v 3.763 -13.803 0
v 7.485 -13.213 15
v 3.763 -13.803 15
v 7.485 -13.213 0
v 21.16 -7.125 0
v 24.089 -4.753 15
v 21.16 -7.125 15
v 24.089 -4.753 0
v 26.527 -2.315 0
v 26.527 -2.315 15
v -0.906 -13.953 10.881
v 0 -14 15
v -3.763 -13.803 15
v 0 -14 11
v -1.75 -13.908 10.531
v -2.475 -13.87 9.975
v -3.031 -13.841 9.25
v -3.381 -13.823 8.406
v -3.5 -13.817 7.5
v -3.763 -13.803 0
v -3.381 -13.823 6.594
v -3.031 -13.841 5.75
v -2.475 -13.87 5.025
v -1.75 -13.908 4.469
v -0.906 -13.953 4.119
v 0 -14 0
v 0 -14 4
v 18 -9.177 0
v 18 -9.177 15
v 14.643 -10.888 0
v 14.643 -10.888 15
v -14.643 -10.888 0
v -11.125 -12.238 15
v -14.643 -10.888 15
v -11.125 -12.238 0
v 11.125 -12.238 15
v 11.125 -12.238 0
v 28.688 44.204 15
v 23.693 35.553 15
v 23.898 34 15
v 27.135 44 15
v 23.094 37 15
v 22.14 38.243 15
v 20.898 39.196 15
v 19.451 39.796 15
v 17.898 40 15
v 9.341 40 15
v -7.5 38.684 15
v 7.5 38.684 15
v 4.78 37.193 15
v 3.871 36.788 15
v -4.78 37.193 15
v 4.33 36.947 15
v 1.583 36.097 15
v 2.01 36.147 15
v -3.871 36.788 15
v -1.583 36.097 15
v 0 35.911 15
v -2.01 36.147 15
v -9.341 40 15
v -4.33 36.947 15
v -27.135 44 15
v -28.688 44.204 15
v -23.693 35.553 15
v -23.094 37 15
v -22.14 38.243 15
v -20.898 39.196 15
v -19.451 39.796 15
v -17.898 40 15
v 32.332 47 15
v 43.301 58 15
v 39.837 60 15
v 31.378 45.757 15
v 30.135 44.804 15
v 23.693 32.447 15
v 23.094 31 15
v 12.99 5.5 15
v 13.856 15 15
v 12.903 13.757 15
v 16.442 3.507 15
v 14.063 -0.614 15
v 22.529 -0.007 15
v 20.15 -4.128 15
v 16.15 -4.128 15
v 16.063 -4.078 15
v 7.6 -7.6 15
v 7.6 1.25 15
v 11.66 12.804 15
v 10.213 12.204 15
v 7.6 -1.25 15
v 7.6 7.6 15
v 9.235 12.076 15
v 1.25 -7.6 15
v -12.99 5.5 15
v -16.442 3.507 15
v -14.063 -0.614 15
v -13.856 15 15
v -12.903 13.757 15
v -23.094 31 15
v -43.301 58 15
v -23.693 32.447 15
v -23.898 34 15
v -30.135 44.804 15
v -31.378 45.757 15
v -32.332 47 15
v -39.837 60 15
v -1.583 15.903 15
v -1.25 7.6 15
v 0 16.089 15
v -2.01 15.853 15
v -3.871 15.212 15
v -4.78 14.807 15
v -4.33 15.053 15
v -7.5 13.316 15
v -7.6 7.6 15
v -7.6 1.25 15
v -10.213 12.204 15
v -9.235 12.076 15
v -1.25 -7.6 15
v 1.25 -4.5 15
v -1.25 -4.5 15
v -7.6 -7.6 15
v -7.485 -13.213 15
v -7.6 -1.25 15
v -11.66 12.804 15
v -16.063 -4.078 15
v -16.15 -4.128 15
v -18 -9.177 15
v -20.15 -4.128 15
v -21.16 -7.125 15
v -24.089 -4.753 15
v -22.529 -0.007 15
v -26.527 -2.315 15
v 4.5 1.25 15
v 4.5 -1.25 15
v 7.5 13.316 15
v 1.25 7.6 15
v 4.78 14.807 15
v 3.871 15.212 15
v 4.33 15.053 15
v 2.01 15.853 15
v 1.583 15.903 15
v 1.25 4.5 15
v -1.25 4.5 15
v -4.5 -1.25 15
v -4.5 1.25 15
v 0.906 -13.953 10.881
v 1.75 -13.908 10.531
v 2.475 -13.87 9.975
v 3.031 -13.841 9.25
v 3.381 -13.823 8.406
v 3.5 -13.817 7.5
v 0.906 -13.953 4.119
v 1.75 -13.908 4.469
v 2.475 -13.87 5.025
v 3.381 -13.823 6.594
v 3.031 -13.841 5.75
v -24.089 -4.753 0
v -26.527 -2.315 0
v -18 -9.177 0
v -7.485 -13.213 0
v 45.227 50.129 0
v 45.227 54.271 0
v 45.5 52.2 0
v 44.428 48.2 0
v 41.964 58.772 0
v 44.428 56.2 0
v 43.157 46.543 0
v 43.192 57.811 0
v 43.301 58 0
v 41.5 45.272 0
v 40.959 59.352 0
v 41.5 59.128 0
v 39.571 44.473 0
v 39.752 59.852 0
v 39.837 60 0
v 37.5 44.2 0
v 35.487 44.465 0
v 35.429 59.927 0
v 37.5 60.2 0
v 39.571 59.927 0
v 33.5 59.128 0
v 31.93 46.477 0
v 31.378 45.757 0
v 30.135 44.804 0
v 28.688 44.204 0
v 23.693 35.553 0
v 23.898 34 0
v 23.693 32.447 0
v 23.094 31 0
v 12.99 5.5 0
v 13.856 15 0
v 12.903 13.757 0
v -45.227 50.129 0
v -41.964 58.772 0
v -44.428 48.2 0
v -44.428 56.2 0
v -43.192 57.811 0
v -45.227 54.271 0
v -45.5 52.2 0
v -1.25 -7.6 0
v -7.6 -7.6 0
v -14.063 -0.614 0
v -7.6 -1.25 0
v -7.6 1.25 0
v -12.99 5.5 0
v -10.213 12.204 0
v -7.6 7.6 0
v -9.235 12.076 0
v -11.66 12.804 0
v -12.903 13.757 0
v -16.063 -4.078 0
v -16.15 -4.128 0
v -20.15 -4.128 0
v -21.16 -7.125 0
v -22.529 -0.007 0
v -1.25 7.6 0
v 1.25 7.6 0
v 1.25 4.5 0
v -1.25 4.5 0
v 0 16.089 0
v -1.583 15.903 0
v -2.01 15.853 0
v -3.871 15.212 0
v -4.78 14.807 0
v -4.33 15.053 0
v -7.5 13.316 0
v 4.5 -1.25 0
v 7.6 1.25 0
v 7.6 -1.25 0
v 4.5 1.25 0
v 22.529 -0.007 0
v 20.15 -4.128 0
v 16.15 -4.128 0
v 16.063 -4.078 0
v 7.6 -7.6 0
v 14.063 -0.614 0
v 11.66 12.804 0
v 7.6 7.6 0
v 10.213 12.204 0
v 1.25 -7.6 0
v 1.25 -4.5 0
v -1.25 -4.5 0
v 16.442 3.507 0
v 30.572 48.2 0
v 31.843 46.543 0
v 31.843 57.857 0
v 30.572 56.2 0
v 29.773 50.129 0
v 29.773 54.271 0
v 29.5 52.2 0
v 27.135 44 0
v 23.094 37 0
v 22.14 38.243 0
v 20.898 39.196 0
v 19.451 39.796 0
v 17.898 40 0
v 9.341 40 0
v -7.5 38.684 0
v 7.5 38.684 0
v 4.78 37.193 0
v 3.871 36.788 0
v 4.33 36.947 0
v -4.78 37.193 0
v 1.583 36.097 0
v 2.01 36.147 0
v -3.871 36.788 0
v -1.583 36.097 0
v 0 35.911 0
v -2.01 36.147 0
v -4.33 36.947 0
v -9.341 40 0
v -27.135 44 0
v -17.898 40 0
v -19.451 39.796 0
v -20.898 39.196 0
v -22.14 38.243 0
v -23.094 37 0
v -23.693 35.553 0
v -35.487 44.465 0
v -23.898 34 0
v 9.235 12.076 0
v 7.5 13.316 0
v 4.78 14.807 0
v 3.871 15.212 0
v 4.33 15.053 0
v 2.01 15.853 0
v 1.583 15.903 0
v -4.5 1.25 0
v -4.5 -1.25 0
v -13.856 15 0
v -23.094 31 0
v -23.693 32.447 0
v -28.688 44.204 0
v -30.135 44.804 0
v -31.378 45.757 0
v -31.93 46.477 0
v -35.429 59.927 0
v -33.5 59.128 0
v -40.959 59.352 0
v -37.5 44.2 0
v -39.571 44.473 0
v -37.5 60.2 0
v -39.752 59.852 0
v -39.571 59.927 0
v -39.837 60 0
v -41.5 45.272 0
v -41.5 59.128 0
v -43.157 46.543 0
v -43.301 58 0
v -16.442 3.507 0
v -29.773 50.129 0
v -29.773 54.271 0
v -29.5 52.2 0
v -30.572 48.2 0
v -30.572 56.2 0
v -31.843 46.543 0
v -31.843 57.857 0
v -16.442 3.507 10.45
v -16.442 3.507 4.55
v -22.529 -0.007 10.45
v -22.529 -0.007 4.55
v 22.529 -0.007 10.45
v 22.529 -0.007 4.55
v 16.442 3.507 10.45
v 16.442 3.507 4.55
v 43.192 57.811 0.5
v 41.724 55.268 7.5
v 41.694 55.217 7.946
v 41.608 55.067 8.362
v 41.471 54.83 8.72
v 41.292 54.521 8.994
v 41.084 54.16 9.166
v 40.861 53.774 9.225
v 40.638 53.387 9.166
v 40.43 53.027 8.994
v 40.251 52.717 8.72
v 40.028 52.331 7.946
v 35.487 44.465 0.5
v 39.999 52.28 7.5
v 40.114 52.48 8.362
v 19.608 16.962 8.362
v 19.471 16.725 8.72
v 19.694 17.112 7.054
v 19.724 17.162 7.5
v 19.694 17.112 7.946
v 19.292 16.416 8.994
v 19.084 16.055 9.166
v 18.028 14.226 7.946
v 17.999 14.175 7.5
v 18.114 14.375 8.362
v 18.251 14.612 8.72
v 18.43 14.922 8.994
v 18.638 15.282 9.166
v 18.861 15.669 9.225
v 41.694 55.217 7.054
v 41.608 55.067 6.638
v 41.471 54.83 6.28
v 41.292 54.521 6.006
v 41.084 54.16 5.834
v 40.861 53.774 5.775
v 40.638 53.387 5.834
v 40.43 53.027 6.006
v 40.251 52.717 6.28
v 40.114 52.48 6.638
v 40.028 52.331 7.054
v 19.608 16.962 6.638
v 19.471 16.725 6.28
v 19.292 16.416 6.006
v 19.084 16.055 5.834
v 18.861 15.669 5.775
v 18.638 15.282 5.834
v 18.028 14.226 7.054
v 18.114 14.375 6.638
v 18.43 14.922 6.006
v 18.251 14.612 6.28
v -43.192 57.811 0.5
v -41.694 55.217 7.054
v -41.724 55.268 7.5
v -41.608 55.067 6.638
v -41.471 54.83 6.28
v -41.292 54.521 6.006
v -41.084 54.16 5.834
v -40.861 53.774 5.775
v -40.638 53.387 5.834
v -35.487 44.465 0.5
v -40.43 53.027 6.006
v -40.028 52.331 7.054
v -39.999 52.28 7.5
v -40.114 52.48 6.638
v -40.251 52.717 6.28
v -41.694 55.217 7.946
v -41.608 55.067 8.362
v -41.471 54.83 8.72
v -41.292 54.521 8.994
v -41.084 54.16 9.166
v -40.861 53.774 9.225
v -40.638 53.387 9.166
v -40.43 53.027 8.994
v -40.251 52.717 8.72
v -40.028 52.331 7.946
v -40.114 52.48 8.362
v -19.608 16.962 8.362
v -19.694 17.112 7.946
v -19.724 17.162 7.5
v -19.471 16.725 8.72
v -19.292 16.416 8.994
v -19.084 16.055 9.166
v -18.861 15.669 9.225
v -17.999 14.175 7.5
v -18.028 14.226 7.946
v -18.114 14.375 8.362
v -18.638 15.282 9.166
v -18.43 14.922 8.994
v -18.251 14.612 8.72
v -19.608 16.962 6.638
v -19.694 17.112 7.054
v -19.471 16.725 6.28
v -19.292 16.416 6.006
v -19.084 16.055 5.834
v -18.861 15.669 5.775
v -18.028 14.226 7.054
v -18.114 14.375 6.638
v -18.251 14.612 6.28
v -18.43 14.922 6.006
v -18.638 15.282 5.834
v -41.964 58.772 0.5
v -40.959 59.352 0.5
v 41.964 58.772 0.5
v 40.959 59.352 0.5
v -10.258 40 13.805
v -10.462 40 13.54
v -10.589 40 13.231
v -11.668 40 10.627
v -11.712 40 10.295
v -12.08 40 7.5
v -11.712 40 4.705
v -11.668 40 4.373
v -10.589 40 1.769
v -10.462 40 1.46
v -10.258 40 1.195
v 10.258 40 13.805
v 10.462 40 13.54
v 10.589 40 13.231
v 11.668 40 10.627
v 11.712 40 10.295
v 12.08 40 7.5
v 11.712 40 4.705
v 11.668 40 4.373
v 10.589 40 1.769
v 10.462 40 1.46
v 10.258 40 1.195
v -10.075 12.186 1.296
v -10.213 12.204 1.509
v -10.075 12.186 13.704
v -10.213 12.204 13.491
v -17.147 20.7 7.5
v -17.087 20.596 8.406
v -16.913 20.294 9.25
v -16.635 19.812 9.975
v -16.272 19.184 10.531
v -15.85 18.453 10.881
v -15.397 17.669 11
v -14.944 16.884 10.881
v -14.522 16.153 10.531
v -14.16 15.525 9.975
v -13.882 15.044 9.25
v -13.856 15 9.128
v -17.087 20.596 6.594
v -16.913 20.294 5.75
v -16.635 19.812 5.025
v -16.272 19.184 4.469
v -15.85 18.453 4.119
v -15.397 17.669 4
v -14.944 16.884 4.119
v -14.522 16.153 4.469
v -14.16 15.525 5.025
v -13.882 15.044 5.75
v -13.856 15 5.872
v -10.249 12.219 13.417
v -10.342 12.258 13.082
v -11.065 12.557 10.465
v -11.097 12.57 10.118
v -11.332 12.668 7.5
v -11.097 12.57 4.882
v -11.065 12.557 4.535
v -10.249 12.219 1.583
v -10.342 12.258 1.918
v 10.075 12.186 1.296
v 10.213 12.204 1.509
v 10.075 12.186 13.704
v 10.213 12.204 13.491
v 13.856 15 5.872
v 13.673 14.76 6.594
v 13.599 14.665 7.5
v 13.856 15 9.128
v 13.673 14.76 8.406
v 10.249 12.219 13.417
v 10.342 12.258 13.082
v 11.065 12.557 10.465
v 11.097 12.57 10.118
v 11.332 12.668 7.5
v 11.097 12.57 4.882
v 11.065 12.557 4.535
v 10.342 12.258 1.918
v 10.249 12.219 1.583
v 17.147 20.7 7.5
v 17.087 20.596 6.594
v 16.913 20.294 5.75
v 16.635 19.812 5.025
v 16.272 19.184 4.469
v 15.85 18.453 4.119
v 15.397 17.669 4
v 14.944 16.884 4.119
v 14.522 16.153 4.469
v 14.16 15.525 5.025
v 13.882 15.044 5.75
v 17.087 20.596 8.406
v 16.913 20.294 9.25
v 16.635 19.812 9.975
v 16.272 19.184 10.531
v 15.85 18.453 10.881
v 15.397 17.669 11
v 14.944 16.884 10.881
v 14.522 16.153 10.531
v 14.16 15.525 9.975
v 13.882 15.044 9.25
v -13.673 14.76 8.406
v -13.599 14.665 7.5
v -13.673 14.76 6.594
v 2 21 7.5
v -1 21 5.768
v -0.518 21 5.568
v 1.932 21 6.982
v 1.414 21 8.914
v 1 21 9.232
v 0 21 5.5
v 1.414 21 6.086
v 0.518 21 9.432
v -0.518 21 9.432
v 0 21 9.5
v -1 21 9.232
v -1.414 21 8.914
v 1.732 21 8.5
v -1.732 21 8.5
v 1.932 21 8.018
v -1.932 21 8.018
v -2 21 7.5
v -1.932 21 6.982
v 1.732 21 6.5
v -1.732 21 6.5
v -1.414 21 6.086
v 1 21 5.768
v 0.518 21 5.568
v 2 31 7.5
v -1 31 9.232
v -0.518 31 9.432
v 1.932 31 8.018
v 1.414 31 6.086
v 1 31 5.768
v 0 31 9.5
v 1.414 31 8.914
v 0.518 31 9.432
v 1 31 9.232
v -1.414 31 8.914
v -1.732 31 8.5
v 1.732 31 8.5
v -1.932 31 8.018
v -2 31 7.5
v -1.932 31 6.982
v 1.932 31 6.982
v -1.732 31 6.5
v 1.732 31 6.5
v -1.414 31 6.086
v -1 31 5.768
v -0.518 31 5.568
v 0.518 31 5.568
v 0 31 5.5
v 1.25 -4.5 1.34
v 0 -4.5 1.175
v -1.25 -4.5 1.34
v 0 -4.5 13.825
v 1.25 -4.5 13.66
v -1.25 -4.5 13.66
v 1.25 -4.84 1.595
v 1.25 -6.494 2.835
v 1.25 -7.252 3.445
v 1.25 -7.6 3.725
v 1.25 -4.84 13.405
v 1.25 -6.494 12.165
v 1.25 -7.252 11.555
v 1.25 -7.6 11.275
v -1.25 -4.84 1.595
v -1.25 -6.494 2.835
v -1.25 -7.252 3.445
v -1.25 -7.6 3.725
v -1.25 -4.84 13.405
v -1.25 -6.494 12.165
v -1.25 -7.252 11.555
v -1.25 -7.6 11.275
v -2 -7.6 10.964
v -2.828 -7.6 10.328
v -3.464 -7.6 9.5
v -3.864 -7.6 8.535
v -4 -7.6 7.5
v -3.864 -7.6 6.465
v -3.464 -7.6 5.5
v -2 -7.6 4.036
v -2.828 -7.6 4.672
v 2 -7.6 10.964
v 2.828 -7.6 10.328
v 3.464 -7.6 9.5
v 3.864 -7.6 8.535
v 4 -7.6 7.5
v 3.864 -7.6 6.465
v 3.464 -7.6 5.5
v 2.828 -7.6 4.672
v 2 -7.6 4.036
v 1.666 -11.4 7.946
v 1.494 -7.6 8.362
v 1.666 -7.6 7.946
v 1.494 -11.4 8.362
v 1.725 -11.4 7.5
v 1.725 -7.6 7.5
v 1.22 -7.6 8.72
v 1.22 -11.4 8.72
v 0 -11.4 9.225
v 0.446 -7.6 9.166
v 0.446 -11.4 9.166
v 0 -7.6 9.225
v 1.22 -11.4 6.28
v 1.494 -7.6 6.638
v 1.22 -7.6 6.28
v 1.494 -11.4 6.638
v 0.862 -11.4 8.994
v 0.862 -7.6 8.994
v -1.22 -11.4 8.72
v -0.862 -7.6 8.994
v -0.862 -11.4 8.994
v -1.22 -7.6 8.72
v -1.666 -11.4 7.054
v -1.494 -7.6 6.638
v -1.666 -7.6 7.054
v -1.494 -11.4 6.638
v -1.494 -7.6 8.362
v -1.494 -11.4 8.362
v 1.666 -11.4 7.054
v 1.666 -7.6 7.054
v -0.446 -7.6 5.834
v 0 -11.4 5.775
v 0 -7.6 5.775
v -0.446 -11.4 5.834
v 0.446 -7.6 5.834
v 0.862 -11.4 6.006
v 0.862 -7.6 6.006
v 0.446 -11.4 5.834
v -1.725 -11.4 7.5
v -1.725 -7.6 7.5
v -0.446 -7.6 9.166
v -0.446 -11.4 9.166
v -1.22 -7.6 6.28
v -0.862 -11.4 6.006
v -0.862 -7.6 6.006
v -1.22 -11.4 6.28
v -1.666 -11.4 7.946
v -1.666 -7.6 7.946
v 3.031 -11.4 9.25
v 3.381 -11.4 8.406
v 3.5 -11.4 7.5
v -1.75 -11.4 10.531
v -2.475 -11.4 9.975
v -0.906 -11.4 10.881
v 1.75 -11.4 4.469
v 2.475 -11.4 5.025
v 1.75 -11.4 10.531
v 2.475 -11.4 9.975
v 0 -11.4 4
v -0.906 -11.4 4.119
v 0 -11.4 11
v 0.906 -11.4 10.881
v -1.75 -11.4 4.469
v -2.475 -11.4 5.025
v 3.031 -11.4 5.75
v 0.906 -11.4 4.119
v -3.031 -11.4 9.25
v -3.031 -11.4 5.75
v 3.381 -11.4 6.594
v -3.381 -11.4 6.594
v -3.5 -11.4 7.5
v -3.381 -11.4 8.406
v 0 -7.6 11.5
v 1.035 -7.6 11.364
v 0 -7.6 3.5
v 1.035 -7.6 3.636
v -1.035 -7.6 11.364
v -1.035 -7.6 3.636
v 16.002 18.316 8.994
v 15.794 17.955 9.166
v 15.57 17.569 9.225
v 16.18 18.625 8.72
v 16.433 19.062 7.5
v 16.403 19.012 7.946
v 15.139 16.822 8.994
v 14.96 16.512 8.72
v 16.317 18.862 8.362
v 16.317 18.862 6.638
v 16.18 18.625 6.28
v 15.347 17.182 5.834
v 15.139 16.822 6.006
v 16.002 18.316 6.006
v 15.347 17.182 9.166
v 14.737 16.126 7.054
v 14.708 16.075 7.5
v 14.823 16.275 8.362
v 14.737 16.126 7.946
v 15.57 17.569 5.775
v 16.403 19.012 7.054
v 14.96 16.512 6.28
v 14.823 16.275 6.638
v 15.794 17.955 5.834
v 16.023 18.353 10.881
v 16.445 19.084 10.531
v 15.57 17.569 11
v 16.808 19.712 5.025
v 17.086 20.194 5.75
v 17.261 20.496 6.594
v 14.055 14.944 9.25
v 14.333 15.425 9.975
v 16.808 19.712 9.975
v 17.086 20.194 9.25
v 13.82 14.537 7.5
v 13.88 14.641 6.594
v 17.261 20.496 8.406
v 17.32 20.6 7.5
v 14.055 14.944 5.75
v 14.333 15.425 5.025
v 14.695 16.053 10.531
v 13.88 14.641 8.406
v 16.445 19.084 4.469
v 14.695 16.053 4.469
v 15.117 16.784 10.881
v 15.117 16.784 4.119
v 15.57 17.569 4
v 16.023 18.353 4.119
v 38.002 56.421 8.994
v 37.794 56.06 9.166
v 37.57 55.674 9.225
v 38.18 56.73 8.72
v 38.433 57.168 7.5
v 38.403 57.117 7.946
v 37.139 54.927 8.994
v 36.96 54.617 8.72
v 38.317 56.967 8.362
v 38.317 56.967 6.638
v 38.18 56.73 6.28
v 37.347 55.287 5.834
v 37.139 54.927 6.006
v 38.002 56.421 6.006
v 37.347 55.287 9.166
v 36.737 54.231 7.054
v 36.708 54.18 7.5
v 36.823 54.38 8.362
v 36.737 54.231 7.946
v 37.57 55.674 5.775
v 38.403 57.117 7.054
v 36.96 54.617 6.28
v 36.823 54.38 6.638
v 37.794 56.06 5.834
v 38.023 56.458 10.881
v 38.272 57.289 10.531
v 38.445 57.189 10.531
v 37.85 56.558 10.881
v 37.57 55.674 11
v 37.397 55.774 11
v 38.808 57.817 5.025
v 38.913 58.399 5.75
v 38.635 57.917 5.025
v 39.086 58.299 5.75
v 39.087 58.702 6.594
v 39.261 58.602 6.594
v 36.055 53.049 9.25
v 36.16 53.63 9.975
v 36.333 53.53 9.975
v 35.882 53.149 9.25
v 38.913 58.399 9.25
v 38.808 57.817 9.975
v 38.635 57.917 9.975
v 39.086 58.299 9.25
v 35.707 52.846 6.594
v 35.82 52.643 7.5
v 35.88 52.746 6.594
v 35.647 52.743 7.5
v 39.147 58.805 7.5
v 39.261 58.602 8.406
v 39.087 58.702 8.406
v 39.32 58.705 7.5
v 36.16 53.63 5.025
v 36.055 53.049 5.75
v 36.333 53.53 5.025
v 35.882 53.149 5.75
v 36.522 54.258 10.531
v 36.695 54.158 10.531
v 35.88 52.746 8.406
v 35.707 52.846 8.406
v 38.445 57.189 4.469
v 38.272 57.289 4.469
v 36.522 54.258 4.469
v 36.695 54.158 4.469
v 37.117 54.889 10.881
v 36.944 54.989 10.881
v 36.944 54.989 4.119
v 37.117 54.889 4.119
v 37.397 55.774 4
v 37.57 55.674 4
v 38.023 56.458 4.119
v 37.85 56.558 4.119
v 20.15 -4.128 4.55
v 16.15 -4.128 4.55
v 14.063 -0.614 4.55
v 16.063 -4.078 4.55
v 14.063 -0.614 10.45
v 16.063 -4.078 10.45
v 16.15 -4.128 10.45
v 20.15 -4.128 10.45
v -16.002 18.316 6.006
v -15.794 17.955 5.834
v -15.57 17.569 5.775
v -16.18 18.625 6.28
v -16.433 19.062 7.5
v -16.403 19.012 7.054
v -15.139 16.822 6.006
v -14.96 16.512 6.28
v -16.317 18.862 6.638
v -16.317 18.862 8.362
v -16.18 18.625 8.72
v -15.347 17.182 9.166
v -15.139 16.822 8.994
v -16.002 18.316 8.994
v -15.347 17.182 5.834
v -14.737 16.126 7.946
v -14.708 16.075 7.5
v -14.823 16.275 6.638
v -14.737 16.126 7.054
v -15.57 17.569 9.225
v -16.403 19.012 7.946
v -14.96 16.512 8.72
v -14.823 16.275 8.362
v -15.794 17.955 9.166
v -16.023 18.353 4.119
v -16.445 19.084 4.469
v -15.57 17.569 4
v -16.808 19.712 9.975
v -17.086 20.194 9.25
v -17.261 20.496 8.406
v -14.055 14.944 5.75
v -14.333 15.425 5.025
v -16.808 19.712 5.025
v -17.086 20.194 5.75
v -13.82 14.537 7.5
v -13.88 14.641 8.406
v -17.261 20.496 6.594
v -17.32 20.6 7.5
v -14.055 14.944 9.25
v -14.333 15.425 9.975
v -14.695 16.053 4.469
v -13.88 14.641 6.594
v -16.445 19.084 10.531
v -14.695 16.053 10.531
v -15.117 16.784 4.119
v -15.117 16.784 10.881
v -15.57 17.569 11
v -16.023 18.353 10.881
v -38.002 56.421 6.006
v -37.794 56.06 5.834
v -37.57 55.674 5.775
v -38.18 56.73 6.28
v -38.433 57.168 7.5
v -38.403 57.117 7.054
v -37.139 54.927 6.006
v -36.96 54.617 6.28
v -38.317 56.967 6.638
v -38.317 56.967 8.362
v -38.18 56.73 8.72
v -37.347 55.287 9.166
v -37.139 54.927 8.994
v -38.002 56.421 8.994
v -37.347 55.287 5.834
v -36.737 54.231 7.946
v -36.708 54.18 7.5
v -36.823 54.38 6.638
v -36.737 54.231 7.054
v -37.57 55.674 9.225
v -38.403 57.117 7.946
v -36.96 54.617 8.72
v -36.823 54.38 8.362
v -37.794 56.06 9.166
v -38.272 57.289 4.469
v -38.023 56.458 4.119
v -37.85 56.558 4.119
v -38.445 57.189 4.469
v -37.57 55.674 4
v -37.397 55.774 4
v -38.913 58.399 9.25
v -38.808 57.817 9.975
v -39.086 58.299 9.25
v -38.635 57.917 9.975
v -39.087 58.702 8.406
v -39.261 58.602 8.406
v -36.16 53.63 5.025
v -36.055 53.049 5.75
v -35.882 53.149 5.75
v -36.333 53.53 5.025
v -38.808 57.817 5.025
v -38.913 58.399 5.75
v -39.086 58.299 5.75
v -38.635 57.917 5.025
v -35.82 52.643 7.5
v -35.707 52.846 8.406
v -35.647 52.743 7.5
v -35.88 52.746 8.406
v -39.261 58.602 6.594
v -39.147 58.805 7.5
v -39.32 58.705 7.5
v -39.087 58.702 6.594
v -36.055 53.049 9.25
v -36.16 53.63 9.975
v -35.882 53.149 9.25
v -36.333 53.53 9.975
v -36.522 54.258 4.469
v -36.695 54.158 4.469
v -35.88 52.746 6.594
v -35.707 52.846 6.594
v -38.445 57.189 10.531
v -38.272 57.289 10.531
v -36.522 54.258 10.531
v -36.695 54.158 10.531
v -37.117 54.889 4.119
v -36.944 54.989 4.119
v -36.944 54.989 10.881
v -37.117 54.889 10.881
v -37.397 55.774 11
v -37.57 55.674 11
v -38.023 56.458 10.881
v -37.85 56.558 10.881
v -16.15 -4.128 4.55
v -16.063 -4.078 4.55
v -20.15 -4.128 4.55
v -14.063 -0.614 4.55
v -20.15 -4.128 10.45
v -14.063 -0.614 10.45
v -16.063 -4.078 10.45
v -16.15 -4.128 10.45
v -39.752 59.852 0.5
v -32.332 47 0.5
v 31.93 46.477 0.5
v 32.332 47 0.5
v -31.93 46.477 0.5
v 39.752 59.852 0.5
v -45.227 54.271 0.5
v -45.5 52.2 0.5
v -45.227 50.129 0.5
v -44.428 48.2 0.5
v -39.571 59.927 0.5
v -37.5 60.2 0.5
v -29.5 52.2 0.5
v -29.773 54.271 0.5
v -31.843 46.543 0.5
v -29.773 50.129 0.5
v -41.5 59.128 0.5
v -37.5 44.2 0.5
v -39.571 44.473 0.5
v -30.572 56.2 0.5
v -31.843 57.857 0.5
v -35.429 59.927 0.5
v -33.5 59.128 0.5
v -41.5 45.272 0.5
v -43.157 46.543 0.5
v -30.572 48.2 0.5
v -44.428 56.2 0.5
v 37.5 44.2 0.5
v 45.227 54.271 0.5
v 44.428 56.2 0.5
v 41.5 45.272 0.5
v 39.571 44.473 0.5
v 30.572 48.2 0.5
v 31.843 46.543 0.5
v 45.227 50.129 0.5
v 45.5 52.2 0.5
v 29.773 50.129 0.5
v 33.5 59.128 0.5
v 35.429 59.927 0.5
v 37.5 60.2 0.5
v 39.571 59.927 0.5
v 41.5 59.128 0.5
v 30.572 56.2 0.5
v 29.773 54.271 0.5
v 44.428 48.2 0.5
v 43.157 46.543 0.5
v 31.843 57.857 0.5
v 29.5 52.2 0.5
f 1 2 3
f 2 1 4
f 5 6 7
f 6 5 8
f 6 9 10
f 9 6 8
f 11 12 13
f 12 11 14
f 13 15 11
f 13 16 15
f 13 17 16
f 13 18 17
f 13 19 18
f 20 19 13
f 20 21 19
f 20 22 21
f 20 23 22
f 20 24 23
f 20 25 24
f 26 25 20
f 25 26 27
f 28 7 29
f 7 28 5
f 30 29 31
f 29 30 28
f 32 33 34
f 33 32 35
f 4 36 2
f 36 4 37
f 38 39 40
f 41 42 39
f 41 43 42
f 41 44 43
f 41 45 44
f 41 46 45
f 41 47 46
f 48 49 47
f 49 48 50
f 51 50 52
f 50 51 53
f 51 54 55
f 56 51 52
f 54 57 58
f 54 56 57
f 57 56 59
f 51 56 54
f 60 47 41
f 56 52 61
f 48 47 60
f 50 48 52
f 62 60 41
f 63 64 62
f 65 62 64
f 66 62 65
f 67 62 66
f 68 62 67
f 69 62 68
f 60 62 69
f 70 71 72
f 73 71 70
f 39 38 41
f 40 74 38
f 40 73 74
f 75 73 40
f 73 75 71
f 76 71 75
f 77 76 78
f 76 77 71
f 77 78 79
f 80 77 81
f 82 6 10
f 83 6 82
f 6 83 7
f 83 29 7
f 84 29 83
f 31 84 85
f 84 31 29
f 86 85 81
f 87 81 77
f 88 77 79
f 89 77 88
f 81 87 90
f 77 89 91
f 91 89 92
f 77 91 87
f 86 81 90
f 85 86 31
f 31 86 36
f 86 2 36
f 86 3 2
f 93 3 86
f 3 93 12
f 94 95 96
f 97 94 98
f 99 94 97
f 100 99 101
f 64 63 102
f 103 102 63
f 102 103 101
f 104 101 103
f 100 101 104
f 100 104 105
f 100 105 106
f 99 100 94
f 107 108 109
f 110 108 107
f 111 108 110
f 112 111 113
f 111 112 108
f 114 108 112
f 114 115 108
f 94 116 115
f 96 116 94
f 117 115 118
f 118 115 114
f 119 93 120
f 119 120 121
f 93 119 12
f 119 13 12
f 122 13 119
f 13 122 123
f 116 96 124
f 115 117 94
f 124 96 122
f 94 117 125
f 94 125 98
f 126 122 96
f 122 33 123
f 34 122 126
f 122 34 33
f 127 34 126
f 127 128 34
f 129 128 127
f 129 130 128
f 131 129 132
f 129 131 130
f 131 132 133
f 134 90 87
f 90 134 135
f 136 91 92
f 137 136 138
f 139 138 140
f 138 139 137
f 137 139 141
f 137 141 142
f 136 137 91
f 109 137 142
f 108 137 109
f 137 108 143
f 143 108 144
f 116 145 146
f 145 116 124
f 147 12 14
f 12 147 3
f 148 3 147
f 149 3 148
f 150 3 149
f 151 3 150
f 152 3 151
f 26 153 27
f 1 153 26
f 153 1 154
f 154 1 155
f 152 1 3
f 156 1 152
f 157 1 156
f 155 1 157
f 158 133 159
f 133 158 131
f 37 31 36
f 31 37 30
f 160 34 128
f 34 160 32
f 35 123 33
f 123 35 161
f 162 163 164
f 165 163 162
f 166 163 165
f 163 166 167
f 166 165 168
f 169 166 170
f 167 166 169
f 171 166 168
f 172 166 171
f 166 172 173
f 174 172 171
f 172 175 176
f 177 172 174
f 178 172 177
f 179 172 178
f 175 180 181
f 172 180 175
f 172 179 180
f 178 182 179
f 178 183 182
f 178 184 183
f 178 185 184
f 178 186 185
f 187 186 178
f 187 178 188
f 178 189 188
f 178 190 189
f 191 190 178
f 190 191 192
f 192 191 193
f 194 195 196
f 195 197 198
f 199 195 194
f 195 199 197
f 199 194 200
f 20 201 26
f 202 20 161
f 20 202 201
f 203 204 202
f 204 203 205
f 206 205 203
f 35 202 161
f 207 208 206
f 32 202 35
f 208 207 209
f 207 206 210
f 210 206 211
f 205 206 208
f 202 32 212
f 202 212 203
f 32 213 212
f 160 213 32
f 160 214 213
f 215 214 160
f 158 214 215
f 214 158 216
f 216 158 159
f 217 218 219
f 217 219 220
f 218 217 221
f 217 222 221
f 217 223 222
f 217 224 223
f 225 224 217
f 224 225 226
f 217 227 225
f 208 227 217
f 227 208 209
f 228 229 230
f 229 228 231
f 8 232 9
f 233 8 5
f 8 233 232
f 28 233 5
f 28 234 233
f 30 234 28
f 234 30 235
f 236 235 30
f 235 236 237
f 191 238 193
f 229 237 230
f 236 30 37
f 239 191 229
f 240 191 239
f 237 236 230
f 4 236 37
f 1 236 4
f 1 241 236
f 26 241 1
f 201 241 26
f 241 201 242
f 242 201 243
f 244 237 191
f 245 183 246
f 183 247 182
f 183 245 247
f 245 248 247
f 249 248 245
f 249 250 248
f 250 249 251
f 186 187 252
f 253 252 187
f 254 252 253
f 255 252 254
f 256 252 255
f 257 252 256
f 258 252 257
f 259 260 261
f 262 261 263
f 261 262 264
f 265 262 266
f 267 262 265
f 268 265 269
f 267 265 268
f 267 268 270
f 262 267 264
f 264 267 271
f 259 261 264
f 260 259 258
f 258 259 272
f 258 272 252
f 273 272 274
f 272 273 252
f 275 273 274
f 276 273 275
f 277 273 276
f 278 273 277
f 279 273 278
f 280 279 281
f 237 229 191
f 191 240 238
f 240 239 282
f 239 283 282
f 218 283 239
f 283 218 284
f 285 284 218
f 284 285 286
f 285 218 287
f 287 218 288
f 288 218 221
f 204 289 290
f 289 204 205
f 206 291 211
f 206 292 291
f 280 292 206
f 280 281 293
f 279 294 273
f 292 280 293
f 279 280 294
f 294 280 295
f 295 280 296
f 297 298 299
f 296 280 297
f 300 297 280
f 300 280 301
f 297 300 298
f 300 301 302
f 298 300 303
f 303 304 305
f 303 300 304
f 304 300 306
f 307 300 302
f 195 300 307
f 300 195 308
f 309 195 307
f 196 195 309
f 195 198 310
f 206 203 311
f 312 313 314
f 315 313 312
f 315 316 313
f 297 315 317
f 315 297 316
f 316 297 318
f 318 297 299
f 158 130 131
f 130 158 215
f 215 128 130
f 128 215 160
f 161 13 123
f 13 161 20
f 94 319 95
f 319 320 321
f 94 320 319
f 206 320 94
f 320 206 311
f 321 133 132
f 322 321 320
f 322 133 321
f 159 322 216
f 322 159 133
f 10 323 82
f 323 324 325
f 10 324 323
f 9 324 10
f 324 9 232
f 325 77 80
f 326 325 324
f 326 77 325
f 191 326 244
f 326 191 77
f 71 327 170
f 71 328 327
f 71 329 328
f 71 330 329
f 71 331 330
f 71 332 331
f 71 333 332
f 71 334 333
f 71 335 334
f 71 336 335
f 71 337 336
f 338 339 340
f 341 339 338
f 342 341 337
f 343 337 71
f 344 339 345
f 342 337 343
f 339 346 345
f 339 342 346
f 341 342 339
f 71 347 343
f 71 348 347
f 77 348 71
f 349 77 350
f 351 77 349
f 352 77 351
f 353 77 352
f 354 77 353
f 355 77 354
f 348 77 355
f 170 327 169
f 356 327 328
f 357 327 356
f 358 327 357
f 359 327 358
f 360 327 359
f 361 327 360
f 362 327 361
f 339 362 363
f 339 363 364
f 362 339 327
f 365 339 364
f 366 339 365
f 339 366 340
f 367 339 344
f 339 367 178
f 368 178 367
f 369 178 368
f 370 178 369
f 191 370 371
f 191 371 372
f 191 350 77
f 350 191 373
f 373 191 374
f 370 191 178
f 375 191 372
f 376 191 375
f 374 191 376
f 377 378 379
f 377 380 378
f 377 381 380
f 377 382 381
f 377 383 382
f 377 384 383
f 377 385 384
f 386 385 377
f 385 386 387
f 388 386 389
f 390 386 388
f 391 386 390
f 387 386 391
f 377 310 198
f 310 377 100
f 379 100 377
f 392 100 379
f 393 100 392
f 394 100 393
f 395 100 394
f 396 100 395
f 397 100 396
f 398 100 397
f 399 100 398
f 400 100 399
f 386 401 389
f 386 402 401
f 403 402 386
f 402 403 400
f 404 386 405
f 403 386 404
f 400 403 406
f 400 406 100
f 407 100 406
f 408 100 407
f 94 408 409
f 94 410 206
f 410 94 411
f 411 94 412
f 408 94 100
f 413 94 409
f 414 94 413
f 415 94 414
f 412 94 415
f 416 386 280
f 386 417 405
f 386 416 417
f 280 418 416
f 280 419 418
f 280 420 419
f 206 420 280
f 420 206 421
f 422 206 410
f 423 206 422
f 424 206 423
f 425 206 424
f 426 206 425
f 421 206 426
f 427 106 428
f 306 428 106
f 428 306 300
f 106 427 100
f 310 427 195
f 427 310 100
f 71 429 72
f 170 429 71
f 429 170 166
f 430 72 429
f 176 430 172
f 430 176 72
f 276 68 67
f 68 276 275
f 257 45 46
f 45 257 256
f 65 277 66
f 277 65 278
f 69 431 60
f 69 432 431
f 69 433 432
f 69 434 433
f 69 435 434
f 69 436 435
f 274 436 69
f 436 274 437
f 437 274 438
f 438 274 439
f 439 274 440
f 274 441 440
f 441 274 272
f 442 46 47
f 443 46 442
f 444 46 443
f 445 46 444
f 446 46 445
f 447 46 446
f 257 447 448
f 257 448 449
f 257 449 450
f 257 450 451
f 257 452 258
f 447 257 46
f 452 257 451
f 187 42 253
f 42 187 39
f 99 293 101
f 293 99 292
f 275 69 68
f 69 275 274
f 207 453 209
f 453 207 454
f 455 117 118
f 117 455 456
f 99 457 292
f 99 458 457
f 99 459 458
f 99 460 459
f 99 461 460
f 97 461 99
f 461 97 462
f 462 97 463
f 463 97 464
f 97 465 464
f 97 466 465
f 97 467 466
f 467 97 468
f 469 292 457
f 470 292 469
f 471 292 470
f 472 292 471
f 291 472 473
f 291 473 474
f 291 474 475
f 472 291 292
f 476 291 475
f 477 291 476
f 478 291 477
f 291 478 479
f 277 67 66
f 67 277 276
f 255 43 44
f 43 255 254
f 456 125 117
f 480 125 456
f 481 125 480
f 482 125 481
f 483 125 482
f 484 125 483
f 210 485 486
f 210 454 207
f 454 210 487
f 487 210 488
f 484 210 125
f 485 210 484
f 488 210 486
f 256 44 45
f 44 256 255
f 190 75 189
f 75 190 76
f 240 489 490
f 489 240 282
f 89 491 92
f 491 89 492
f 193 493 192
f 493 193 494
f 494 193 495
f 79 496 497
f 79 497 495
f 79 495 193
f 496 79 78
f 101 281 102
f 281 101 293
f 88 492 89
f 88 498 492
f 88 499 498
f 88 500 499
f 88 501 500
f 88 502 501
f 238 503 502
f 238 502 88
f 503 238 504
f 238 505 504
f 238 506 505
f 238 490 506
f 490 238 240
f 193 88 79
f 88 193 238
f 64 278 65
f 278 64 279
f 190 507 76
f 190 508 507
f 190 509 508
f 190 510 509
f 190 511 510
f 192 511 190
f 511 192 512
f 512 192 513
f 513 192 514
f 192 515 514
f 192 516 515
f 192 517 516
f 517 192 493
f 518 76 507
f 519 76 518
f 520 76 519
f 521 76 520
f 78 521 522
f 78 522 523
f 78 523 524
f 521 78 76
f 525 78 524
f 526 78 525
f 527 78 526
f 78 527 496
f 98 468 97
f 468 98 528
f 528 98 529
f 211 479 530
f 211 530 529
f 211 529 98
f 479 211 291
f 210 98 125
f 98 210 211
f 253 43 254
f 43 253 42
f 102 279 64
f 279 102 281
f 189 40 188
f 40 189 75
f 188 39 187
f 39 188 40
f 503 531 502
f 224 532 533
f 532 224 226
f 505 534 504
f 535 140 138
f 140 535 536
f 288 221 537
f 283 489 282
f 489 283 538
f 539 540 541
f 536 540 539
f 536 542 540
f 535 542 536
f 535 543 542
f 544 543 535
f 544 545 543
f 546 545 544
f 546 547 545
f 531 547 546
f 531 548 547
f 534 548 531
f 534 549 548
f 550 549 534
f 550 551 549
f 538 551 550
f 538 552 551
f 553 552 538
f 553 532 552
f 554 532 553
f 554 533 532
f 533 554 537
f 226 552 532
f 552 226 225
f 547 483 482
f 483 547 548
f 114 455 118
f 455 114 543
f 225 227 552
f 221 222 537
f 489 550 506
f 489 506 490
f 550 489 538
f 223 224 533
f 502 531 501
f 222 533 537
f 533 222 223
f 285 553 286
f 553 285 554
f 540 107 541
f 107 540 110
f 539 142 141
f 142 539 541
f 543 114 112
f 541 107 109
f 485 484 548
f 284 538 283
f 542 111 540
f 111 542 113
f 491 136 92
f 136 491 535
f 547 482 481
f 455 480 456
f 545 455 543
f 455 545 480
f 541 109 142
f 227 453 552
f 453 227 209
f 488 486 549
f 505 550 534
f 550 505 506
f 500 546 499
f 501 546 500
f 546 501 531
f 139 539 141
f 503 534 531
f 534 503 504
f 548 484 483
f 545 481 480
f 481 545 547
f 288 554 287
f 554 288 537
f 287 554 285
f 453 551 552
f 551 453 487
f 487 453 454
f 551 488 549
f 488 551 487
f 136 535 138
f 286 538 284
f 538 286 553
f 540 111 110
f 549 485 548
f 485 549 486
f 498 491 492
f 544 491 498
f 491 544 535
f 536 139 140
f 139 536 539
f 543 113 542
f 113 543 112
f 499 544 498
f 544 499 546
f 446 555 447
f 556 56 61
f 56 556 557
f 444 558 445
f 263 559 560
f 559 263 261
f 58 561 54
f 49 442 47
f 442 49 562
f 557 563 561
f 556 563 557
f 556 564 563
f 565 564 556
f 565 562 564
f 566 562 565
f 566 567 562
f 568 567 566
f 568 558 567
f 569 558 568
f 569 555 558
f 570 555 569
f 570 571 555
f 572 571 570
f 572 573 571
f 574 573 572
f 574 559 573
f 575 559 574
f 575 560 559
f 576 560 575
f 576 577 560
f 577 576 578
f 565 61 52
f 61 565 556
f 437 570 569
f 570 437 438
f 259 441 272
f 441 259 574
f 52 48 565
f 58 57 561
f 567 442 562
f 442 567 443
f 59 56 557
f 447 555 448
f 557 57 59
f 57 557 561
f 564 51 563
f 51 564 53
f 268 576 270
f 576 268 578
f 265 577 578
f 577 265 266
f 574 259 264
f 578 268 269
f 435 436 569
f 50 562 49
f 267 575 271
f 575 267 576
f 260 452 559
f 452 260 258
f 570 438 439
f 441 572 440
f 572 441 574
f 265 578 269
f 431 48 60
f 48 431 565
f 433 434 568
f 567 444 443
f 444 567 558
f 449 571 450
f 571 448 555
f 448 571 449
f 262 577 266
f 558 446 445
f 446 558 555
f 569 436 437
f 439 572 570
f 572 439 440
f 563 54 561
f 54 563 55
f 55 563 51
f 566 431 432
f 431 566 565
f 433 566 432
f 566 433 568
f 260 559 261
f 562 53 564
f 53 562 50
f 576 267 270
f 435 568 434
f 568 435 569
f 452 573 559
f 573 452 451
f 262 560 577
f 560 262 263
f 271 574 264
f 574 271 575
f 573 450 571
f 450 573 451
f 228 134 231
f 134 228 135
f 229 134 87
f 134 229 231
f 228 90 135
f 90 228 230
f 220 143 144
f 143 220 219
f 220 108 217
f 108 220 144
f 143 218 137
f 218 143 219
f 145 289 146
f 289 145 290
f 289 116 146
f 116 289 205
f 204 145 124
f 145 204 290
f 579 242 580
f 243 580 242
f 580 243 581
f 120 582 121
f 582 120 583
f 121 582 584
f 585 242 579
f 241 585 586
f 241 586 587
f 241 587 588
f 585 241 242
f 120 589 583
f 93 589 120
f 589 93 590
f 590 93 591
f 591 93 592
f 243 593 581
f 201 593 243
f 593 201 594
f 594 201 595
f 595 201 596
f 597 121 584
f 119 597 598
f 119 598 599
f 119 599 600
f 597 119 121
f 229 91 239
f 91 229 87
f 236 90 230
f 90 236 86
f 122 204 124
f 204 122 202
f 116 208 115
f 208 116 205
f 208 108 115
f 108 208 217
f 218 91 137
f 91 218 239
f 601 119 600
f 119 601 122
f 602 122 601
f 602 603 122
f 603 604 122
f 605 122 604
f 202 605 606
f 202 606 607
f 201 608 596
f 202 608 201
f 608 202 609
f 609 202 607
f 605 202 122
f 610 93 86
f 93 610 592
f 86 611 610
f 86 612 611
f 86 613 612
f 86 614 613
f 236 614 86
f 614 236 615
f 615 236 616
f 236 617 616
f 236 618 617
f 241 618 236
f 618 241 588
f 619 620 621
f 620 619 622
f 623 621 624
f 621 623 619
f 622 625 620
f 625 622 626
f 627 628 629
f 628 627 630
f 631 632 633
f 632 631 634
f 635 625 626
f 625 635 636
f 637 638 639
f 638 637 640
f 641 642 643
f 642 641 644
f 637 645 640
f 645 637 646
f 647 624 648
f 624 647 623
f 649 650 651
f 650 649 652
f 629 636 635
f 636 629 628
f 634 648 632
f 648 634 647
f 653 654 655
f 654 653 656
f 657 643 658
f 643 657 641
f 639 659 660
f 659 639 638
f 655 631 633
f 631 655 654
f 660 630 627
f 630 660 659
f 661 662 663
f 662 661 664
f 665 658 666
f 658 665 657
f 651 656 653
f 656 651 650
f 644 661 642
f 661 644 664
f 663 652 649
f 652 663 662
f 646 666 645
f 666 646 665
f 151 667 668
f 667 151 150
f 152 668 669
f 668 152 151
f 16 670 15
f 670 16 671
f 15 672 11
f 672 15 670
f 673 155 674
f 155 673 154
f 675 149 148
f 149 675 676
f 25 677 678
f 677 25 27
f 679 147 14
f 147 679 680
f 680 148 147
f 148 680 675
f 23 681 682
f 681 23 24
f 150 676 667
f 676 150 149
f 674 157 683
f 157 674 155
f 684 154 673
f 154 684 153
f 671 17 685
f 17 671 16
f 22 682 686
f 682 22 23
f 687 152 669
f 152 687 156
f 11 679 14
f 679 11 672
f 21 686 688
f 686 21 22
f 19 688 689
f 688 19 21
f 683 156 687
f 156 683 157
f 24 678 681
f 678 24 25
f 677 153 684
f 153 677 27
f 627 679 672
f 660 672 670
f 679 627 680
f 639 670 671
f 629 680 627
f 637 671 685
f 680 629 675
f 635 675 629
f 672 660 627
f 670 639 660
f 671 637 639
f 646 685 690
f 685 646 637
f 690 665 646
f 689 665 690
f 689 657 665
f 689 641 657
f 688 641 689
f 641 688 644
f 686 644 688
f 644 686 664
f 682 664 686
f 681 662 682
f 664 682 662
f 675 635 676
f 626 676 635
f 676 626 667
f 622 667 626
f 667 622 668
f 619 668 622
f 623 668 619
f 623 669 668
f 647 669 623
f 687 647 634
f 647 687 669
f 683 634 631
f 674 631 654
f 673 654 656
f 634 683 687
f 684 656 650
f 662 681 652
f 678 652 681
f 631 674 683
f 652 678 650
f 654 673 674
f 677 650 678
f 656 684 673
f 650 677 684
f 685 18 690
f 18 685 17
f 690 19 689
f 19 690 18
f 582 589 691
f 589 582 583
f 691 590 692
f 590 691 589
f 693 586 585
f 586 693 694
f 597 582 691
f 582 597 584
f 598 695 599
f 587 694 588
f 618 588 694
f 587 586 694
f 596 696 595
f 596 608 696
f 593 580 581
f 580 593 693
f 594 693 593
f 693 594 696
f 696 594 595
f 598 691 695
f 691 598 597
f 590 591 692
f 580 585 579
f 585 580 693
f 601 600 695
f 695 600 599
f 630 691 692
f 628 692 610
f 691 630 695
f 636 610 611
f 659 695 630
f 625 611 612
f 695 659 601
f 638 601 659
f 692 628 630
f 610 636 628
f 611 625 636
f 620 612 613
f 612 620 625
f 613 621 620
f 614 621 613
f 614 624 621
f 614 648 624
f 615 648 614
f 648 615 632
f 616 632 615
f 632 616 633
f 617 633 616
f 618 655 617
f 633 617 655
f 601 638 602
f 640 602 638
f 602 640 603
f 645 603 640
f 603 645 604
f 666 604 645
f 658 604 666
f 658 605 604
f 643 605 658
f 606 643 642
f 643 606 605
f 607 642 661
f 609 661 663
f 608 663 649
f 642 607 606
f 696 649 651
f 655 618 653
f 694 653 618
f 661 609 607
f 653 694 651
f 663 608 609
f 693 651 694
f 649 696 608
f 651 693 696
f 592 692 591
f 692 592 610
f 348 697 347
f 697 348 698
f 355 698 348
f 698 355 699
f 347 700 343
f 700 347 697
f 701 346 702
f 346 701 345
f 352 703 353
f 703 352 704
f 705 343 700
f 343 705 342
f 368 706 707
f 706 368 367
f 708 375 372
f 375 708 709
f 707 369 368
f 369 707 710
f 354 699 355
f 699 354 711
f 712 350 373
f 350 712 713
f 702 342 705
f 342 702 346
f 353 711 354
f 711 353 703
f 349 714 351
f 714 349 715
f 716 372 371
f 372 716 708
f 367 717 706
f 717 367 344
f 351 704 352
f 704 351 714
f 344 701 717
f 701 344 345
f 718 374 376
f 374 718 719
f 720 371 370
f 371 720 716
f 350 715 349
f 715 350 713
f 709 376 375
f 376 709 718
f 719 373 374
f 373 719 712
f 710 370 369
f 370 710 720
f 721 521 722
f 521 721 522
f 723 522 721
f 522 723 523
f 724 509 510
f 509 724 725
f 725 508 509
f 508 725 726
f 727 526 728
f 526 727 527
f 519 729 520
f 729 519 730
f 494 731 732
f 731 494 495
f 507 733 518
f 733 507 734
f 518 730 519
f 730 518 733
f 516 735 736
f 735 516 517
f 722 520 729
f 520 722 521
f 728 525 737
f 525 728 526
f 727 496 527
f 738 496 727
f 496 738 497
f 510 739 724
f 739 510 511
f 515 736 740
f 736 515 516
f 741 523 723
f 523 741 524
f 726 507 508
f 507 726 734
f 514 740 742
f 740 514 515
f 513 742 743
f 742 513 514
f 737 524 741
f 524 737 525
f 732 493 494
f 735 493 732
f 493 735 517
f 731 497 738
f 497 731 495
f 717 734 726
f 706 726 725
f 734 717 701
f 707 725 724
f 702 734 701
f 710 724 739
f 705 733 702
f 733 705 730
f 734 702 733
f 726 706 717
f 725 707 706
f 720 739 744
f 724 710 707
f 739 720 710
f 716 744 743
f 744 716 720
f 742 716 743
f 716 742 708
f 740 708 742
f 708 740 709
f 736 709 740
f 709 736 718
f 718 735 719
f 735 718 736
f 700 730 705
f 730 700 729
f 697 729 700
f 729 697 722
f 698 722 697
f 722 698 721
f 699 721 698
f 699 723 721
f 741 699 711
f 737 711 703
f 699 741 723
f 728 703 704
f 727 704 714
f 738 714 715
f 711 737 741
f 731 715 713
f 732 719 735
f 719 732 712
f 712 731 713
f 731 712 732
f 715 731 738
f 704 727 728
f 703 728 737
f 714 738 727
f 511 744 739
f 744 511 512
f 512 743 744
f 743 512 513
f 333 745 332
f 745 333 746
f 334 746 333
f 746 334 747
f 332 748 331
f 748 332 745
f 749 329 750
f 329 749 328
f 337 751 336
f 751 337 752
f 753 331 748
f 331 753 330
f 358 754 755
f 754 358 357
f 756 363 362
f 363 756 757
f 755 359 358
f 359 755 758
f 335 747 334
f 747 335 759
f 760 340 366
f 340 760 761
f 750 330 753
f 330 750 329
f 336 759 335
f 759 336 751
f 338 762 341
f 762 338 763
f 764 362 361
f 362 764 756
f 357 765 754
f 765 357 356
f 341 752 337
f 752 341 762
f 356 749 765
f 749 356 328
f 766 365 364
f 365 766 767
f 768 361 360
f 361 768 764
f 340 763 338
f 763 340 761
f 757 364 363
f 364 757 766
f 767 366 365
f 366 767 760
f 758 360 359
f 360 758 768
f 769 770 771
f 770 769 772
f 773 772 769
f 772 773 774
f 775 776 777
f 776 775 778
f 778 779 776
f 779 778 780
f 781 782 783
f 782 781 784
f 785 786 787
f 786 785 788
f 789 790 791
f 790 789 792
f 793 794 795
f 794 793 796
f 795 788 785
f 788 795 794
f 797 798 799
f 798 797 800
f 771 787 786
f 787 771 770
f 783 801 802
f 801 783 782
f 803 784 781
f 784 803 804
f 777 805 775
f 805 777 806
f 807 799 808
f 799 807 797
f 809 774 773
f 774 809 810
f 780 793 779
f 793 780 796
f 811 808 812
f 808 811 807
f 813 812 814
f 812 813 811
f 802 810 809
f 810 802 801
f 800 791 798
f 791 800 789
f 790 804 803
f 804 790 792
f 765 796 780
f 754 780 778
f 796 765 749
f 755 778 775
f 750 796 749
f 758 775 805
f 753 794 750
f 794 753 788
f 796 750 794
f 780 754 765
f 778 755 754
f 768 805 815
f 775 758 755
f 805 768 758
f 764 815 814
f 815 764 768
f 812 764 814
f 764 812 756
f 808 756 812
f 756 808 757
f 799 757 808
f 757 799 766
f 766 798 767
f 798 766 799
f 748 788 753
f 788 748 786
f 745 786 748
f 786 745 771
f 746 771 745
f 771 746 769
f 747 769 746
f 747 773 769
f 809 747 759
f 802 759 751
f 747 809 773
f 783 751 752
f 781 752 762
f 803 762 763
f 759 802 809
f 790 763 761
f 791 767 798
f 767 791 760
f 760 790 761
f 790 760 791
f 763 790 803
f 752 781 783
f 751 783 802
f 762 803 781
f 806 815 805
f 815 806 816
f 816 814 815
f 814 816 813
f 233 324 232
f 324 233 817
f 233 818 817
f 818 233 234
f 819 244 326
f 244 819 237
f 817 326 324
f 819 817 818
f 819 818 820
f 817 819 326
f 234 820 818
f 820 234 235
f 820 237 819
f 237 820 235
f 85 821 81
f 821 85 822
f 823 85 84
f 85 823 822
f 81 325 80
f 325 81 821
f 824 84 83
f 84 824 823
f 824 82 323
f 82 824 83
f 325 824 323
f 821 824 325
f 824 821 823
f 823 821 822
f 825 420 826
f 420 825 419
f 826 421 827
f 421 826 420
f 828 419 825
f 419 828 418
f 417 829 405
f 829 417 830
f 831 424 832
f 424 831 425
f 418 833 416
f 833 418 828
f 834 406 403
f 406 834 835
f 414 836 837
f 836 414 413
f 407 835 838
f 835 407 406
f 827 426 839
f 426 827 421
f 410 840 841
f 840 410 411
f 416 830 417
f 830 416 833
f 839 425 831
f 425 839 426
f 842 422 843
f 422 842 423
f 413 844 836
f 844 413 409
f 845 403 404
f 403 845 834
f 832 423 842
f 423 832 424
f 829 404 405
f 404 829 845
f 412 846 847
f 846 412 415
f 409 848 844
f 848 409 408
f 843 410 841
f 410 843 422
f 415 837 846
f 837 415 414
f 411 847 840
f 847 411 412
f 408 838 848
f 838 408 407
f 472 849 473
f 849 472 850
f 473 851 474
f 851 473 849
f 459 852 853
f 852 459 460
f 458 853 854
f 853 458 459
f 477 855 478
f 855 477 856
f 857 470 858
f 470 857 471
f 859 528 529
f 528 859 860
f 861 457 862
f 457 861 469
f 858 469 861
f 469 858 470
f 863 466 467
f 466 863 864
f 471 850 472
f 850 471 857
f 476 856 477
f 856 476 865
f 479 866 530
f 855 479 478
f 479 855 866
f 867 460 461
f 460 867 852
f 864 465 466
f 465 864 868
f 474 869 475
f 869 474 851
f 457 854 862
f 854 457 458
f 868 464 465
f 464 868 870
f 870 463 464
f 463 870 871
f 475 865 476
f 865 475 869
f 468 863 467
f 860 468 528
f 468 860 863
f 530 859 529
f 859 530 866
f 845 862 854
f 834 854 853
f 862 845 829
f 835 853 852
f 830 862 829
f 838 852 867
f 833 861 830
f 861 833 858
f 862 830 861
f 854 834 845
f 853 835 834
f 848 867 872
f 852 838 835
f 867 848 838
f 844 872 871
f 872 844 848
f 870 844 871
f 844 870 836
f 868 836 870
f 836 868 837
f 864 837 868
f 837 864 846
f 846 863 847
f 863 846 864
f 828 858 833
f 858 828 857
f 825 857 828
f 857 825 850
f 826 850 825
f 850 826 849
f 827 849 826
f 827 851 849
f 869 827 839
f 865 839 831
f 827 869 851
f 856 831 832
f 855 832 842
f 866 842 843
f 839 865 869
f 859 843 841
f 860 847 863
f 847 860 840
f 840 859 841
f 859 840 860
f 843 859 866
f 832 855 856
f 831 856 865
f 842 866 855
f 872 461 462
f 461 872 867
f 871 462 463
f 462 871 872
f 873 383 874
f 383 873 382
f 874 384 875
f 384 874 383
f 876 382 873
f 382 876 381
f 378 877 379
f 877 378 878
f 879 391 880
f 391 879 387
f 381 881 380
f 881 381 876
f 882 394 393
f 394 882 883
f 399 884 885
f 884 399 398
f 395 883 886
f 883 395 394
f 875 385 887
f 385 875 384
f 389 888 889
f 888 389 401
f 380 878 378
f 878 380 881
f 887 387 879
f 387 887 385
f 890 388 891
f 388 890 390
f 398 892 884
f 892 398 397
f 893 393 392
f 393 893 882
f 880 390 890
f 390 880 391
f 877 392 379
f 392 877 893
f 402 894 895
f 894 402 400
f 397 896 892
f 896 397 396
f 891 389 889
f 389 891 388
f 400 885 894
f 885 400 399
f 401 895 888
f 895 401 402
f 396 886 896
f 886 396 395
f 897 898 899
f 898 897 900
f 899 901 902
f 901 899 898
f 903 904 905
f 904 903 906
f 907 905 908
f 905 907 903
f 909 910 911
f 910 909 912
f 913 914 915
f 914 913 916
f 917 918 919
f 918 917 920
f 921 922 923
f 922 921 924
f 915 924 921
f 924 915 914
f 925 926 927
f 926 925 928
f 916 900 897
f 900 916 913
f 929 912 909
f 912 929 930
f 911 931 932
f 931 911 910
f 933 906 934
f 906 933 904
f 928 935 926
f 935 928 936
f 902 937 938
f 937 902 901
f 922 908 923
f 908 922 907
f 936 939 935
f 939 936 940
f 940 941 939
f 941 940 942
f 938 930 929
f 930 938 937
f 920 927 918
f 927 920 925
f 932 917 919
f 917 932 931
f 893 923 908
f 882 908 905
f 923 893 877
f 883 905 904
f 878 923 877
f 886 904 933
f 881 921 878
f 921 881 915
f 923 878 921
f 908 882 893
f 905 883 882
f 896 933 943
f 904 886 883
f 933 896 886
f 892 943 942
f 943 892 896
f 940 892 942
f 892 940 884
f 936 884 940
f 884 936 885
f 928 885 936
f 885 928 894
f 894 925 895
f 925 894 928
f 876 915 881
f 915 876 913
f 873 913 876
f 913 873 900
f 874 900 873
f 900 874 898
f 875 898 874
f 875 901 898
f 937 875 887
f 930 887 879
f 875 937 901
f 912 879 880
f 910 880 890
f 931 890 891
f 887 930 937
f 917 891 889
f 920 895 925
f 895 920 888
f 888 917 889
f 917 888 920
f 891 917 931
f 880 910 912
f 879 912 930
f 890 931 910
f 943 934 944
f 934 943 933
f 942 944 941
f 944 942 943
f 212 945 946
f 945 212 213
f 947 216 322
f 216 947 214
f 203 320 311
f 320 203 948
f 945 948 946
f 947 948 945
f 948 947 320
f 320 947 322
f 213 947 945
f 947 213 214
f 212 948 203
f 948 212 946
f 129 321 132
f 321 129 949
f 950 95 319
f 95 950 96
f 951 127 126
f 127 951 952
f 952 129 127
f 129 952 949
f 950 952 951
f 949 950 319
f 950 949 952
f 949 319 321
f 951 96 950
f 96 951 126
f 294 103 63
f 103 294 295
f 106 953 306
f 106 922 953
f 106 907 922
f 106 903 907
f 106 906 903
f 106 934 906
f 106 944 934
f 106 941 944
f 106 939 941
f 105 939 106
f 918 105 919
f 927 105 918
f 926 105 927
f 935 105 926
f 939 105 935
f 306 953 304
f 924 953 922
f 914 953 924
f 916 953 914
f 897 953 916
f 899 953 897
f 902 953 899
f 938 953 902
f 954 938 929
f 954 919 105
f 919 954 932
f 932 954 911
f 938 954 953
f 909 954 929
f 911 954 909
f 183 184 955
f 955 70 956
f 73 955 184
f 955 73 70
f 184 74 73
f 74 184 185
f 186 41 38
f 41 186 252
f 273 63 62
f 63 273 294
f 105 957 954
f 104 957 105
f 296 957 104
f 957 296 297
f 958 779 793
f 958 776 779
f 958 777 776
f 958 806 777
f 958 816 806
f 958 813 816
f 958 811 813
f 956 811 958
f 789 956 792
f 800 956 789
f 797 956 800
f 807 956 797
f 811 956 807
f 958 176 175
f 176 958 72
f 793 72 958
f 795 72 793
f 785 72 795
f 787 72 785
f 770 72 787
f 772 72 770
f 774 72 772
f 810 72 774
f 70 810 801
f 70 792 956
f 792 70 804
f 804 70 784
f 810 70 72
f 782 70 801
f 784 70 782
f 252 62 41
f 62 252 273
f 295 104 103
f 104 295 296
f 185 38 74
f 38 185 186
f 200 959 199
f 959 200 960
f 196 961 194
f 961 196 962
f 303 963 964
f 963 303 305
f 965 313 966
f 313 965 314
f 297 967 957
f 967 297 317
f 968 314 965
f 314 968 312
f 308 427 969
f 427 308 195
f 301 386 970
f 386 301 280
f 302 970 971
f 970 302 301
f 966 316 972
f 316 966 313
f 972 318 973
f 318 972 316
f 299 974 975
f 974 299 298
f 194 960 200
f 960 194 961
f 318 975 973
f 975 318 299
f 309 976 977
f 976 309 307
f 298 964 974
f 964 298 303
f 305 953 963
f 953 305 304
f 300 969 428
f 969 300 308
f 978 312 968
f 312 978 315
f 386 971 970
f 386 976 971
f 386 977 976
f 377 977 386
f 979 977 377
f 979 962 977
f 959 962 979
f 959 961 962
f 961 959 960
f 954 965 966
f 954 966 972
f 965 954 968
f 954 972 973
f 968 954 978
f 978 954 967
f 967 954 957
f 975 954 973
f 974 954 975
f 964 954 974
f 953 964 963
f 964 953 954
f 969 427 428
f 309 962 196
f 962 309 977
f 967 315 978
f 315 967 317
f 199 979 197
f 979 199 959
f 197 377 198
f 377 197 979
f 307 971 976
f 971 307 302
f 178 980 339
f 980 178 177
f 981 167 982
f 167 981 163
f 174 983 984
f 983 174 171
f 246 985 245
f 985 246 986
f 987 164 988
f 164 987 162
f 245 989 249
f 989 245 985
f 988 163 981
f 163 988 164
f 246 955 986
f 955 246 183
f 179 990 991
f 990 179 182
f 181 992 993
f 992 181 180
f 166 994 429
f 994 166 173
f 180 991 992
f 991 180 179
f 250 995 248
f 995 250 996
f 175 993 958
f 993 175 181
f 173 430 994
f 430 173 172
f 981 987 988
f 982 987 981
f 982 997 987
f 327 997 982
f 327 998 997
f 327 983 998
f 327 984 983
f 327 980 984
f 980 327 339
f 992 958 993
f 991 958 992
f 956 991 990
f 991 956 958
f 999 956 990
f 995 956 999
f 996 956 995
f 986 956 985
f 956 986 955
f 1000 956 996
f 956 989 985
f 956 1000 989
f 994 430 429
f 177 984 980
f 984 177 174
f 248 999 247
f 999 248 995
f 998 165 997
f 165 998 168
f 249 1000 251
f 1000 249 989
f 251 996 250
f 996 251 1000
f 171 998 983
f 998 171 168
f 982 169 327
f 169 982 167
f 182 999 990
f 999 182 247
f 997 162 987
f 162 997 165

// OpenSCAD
// file: configuration.scad
/**
 * @author Johann Rocholl <johann@rocholl.net>
 * @license GPL-3.0
 */

// Increase this if your slicer or printer make holes too tight.
extra_radius = 0.1;

// OD = outside diameter, corner to corner.
m3_nut_od = 6.1;
m3_nut_radius = m3_nut_od/2 + 0.2 + extra_radius;
m3_washer_radius = 3.5 + extra_radius;

// Major diameter of metric 3mm thread.
m3_major = 2.85;
m3_radius = m3_major/2 + extra_radius;
m3_wide_radius = m3_major/2 + extra_radius + 0.2;

// NEMA17 stepper motors.
motor_shaft_diameter = 5;
motor_shaft_radius = motor_shaft_diameter/2 + extra_radius;

// Frame brackets. M3x8mm screws work best with 3.6 mm brackets.
thickness = 3.6;

// OpenBeam or Misumi. Currently only 15x15 mm, but there is a plan
// to make models more parametric and allow 20x20 mm in the future.
extrusion = 15;

// Placement for the NEMA17 stepper motors.
motor_offset = 44;
motor_length = 47;
// main file
/**
 * @author Johann Rocholl <johann@rocholl.net>
 * @license GPL-3.0
 */

include <configuration.scad>;

$fn = 24;
roundness = 6;

module extrusion_cutout(h, extra) {
  difference() {
    cube([extrusion+extra, extrusion+extra, h], center=true);
    for (a = [0:90:359]) rotate([0, 0, a]) {
      translate([extrusion/2, 0, 0])
        cube([6, 2.5, h+1], center=true);
    }
  }
}

module screw_socket() {
  cylinder(r=m3_wide_radius, h=20, center=true);
  translate([0, 0, 3.8]) cylinder(r=3.5, h=5);
}

module screw_socket_cone() {
  union() {
    screw_socket();
    scale([1, 1, -1]) cylinder(r1=4, r2=7, h=4);
  }
}

module vertex(height, idler_offset, idler_space) {
  union() {
    // Pads to improve print bed adhesion for slim ends.
    translate([-37.5, 52.2, -height/2]) cylinder(r=8, h=0.5);
    translate([37.5, 52.2, -height/2]) cylinder(r=8, h=0.5);
    difference() {
      union() {
        intersection() {
          translate([0, 22, 0])
            cylinder(r=36, h=height, center=true, $fn=60);
          translate([0, -37, 0]) rotate([0, 0, 30])
            cylinder(r=50, h=height+1, center=true, $fn=6);
        }
        translate([0, 38, 0]) intersection() {
          rotate([0, 0, -90])
            cylinder(r=55, h=height, center=true, $fn=3);
          translate([0, 10, 0])
            cube([100, 100, 2*height], center=true);
          translate([0, -10, 0]) rotate([0, 0, 30])
            cylinder(r=55, h=height+1, center=true, $fn=6);
        }
      }
      difference() {
        translate([0, 58, 0]) minkowski() {
          intersection() {
            rotate([0, 0, -90])
              cylinder(r=55, h=height, center=true, $fn=3);
            translate([0, -32, 0])
              cube([100, 16, 2*height], center=true);
          }
          cylinder(r=roundness, h=1, center=true);
        }
        // Idler support cones.
        translate([0, 26+idler_offset-30, 0]) rotate([-90, 0, 0])
          cylinder(r1=30, r2=2, h=30-idler_space/2);
        translate([0, 26+idler_offset+30, 0]) rotate([90, 0, 0])
          cylinder(r1=30, r2=2, h=30-idler_space/2);
      }
      translate([0, 58, 0]) minkowski() {
        intersection() {
          rotate([0, 0, -90])
            cylinder(r=55, h=height, center=true, $fn=3);
          translate([0, 7, 0])
            cube([100, 30, 2*height], center=true);
        }
        cylinder(r=roundness, h=1, center=true);
      }
      extrusion_cutout(height+10, 2*extra_radius);
      for (z = [0:30:height]) {
        translate([0, -7.5-extra_radius, z+7.5-height/2]) rotate([90, 0, 0])
          screw_socket_cone();
        for (a = [-1, 1]) {
          rotate([0, 0, 30*a]) translate([-16*a, 111, z+7.5-height/2]) {
            // % rotate([90, 0, 0]) extrusion_cutout(200, 0);
            // Screw sockets.
            for (y = [-88, -44]) {
              translate([a*7.5, y, 0]) rotate([0, a*90, 0]) screw_socket();
            }
            // Nut tunnels.
	    for (z = [-1, 1]) {
	      scale([1, 1, z]) translate([0, -100, 3]) minkowski() {
	        rotate([0, 0, -a*30]) cylinder(r=4, h=16, $fn=6);
		cube([0.1, 5, 0.1], center=true);
	      }
            }
          }
        }
      }
    }
  }
}

translate([0, 0, 7.5]) vertex(15, idler_offset=0, idler_space=10);
